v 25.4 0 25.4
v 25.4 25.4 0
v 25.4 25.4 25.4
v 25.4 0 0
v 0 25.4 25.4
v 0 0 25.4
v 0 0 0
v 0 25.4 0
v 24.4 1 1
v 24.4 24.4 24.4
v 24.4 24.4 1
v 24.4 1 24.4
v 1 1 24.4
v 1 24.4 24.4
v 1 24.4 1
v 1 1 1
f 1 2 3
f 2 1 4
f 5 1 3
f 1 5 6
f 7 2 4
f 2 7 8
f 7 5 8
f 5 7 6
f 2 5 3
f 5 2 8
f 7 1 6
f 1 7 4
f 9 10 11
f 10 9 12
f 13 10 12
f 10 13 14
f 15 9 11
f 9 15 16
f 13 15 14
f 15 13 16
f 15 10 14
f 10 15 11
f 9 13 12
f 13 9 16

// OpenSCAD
difference() {
	cube(size = [25.4000000000, 25.4000000000, 25.4000000000]);
	translate(v = [1, 1, 1]) {
		cube(size = [23.4000000000, 23.4000000000, 23.4000000000]);
	}
}
